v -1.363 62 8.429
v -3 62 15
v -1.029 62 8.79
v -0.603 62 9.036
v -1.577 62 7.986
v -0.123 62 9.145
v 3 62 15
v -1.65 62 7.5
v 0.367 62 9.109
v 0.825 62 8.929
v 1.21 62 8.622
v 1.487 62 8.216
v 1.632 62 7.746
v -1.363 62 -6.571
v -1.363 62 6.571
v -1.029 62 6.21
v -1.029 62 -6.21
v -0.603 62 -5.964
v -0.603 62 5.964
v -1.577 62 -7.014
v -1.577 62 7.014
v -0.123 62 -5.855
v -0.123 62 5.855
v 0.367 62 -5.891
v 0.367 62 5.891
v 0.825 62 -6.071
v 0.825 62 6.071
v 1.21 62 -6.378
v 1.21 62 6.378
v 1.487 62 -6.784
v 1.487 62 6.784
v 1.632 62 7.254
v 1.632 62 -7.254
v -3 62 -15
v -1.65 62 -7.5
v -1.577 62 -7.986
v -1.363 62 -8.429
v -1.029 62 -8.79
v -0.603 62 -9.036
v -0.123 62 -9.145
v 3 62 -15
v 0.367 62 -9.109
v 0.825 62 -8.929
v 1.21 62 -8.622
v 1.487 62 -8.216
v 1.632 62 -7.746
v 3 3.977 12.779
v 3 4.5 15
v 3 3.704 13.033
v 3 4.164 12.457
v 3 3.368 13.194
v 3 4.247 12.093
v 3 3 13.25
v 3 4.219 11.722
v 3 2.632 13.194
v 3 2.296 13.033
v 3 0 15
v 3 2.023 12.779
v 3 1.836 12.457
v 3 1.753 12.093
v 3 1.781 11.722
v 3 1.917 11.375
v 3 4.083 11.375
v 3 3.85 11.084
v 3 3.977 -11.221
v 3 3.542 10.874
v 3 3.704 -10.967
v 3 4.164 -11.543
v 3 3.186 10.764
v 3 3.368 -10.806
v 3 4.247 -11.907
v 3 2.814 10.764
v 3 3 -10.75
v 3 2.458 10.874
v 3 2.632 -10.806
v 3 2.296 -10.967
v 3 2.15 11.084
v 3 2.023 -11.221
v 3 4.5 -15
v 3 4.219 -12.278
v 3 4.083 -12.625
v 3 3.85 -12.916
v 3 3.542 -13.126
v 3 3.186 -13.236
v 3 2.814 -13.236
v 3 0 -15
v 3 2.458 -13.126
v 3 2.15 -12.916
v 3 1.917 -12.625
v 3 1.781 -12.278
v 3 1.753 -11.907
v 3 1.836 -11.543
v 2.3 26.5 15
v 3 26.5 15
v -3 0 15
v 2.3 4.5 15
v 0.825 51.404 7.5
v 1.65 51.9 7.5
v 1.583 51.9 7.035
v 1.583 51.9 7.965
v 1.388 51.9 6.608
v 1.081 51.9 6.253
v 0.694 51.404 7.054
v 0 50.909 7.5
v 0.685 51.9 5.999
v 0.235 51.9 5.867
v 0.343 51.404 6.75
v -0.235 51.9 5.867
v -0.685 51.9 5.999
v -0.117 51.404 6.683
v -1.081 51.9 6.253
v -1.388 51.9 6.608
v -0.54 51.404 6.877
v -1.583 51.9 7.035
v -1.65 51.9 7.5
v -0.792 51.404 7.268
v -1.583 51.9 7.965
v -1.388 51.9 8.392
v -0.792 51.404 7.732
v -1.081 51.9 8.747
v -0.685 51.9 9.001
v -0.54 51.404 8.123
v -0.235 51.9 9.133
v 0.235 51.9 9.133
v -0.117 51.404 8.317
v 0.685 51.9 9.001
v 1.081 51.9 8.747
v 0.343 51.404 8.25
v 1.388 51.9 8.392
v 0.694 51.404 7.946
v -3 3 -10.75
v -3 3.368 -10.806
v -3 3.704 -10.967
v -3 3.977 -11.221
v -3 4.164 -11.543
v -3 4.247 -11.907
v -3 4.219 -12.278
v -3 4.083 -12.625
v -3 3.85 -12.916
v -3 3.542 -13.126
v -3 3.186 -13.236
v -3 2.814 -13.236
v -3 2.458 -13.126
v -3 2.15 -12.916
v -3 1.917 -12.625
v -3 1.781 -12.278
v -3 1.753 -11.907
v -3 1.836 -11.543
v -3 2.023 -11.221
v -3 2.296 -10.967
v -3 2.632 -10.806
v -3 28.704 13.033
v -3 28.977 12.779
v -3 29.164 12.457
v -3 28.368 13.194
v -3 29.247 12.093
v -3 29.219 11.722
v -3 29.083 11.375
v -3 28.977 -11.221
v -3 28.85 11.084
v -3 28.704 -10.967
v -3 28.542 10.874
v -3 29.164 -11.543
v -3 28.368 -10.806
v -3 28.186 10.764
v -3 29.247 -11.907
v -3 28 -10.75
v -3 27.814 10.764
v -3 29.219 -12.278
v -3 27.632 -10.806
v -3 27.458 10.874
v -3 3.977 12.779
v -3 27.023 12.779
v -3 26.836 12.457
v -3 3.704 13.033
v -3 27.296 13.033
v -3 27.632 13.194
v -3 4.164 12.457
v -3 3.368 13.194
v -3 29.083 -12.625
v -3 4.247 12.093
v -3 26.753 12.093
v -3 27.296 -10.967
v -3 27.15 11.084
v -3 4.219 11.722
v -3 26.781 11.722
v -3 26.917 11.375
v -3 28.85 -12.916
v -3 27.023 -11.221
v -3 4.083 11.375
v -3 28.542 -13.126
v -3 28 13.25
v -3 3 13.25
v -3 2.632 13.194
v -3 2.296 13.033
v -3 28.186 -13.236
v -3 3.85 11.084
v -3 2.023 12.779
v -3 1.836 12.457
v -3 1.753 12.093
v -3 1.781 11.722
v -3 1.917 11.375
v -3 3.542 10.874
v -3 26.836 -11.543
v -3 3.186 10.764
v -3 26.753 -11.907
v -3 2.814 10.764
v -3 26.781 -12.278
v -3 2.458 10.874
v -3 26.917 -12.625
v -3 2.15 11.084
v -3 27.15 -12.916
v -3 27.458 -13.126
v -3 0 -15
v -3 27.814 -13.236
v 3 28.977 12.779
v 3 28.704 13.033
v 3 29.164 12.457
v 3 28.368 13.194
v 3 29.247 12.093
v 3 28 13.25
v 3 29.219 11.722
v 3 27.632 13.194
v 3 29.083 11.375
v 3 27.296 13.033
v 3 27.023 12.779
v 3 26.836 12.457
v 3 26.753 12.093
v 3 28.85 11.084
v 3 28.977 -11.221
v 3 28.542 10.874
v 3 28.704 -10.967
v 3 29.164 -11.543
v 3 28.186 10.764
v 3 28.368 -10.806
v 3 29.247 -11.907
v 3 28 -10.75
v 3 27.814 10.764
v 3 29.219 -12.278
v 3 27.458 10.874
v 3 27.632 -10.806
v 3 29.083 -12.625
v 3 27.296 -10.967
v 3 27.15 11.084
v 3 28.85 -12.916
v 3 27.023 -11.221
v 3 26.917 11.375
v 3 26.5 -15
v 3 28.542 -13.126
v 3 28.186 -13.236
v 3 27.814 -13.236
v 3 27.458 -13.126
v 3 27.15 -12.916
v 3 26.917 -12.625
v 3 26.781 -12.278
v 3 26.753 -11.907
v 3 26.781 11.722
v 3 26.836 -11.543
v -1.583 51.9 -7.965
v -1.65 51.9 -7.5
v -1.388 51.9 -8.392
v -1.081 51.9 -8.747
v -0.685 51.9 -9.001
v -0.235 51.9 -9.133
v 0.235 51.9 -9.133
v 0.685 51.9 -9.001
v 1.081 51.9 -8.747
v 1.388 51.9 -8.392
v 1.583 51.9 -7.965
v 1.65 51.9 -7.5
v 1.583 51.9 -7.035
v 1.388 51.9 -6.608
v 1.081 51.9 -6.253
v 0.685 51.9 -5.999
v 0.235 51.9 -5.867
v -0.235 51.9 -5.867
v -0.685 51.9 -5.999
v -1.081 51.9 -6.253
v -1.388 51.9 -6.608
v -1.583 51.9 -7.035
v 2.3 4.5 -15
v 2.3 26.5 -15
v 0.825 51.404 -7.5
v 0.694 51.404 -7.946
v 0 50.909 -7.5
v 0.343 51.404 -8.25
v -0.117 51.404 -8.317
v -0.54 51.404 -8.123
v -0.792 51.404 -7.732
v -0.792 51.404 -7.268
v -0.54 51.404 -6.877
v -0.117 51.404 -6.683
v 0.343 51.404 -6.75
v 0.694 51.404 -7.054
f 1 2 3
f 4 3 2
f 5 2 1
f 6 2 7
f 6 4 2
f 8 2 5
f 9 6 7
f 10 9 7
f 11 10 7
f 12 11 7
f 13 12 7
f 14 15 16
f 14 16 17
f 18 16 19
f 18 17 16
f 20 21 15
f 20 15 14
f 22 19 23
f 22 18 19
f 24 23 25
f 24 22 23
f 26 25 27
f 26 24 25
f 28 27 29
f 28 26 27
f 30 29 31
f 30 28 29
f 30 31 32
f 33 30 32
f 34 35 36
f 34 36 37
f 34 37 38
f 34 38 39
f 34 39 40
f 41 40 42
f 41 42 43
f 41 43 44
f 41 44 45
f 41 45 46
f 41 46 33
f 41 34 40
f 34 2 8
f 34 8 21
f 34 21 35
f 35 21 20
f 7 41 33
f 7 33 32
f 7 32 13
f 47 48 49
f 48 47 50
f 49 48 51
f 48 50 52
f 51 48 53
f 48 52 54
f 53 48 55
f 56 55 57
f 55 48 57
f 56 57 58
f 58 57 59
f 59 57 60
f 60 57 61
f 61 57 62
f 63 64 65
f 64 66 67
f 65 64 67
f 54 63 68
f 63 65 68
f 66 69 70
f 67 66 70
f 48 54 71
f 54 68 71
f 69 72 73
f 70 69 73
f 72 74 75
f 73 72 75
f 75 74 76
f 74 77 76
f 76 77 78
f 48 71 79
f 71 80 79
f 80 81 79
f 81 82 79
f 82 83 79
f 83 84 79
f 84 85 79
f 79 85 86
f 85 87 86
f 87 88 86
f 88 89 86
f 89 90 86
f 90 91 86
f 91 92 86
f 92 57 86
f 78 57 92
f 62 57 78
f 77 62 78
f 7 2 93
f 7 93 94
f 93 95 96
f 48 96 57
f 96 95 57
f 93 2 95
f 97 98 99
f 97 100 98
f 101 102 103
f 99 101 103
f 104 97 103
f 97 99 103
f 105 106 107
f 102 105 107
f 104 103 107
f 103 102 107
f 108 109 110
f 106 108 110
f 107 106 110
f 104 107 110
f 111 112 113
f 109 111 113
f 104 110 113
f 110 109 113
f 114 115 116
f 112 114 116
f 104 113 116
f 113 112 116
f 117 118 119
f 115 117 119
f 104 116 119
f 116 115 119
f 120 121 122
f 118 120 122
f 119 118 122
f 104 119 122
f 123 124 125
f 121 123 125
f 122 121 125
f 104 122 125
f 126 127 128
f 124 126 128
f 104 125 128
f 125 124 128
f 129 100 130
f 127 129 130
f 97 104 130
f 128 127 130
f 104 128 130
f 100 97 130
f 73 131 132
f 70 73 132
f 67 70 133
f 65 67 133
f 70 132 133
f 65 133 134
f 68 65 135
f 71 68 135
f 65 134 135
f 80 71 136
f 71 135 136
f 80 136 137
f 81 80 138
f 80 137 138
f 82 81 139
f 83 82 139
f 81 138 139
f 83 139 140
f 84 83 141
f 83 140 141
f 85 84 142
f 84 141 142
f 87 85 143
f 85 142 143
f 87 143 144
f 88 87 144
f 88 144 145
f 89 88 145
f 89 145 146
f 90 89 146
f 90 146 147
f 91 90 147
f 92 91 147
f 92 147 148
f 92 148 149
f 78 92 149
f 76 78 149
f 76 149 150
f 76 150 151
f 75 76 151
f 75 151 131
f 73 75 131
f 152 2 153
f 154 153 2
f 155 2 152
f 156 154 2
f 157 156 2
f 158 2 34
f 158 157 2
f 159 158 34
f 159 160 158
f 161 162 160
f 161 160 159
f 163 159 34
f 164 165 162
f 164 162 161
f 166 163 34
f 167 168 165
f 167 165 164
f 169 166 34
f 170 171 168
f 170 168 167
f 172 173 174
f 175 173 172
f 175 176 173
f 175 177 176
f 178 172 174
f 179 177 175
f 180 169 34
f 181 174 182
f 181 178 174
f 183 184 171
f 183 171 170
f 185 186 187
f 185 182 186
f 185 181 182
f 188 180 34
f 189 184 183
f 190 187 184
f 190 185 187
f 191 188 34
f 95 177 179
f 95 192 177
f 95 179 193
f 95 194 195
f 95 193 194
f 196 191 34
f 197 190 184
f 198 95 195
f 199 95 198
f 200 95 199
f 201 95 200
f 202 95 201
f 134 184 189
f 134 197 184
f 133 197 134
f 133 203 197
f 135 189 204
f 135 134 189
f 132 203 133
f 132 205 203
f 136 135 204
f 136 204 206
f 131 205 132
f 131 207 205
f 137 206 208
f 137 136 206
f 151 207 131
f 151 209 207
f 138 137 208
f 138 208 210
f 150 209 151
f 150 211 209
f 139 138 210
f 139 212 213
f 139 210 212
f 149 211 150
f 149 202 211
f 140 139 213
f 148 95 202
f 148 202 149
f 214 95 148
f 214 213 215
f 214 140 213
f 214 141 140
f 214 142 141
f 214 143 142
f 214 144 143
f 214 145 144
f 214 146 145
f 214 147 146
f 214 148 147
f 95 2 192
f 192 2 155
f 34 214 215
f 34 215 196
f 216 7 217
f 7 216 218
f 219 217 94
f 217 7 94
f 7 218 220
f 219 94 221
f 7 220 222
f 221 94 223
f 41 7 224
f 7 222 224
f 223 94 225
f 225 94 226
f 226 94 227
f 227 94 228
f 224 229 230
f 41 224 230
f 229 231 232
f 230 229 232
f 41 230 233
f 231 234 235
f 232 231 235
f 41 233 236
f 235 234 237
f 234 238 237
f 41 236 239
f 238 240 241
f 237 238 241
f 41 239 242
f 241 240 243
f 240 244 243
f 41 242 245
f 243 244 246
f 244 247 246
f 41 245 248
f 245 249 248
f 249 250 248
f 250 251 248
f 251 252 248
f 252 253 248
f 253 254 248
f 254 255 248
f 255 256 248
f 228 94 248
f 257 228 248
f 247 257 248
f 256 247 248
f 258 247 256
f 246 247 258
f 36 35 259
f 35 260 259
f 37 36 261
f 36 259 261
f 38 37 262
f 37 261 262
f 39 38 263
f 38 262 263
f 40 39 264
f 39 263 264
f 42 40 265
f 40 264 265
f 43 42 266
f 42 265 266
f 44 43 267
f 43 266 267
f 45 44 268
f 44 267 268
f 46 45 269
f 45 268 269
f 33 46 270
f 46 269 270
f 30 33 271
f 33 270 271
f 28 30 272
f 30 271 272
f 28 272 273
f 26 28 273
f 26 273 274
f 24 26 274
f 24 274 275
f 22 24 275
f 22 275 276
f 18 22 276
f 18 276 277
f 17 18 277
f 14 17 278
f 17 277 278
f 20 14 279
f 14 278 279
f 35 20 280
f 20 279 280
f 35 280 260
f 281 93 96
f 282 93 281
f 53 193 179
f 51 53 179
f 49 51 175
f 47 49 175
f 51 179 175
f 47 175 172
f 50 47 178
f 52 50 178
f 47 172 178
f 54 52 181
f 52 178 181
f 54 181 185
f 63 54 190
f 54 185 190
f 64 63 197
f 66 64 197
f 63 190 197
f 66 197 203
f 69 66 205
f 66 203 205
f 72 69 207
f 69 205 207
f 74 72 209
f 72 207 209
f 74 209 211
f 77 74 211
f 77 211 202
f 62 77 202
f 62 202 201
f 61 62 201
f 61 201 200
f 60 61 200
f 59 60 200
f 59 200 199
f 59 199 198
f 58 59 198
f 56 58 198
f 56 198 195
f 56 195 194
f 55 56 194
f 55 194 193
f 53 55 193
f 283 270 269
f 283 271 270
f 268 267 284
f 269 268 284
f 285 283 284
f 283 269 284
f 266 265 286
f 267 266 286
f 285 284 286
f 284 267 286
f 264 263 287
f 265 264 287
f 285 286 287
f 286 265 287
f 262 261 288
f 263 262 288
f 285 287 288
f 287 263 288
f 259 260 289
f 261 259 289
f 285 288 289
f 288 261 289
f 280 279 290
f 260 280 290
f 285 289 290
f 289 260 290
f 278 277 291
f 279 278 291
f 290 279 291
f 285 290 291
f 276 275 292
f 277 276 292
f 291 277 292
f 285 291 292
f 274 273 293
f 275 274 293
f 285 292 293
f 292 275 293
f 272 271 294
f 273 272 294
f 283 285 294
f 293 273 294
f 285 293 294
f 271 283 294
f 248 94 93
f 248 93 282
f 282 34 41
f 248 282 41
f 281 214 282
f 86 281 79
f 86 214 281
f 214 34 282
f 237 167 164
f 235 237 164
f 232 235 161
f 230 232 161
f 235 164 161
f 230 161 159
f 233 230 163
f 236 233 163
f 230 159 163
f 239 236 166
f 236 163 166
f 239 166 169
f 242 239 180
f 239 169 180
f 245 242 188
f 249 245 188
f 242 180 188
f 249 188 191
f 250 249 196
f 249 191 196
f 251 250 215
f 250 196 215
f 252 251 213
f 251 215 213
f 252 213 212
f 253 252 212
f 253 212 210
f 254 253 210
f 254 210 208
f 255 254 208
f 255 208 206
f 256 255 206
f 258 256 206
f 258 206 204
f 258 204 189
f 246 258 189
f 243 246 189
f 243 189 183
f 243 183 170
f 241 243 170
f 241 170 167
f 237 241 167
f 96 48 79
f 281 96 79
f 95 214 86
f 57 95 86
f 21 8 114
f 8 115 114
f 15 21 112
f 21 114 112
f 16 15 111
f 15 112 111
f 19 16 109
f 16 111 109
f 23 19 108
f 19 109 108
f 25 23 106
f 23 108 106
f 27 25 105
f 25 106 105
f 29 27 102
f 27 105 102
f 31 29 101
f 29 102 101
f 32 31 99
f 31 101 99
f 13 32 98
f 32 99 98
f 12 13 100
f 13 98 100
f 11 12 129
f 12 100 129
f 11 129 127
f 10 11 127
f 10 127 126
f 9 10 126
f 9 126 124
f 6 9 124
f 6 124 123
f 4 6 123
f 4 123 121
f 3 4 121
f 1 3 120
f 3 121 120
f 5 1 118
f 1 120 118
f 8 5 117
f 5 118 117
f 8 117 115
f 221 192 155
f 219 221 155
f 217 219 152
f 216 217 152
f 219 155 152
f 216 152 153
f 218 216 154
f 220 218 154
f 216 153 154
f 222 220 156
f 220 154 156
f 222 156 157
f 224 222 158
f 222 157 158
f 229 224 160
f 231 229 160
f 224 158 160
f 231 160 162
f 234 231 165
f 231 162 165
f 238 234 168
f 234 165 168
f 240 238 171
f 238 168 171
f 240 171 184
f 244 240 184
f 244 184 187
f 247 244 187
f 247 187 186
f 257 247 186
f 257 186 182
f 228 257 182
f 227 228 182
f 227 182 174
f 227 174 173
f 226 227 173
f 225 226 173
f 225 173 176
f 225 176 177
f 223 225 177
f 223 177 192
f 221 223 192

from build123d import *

# Parameters (mm, degrees)
SKETCH_1_W             = 6
SKETCH_1_H             = 30
EXTRUDE_1_DEPTH        = 62
HOLE_WIZARD_M4_1_D     = 3.3
HOLE_WIZARD_M4_1_DEPTH = 10.1
HOLE_WIZARD_M4_1_TIP   = 0.991420021
SKETCH_4_W             = 30
SKETCH_4_H             = 22
CUT_EXTRUDE_1_DEPTH    = 0.7
HOLE_WIZARD_M3_1_D     = 2.5


with BuildPart() as part:
    # 草图1 → 凸台-拉伸1 (new body)
    with BuildSketch(Plane(origin=(0, 0, 0), x_dir=(1, 0, 0), z_dir=(0, 1, 0))):
        Rectangle(SKETCH_1_W, SKETCH_1_H)
    extrude(amount=EXTRUDE_1_DEPTH)

    # M4 螺纹孔1
    with Locations(Plane(origin=(0, 62, 0), x_dir=(1, 0, 0), z_dir=(0, 1, 0))):
        with Locations((0, 7.5), (0, -7.5)):
            Hole(HOLE_WIZARD_M4_1_D / 2, depth=HOLE_WIZARD_M4_1_DEPTH)
            with Locations((0, 0, -(HOLE_WIZARD_M4_1_DEPTH + HOLE_WIZARD_M4_1_TIP / 2))):  # 118° drill point
                Cone(0, HOLE_WIZARD_M4_1_D / 2, HOLE_WIZARD_M4_1_TIP, mode=Mode.SUBTRACT)

    # 草图4 → 切除-拉伸1 (cut)
    with BuildSketch(Plane(origin=(3, 0, 0), x_dir=(0, 0, -1), z_dir=(1, 0, 0))):
        with Locations((0, 15.5)):
            Rectangle(SKETCH_4_W, SKETCH_4_H)
    extrude(amount=-CUT_EXTRUDE_1_DEPTH, mode=Mode.SUBTRACT)

    # M3 螺纹孔1 (through all)
    with Locations(Plane(origin=(3, 0, 0), x_dir=(0, 0, -1), z_dir=(1, 0, 0))):
        with Locations((-12, 28), (12, 28), (12, 3), (-12, 3)):
            Hole(HOLE_WIZARD_M3_1_D / 2)


solid = part.part
